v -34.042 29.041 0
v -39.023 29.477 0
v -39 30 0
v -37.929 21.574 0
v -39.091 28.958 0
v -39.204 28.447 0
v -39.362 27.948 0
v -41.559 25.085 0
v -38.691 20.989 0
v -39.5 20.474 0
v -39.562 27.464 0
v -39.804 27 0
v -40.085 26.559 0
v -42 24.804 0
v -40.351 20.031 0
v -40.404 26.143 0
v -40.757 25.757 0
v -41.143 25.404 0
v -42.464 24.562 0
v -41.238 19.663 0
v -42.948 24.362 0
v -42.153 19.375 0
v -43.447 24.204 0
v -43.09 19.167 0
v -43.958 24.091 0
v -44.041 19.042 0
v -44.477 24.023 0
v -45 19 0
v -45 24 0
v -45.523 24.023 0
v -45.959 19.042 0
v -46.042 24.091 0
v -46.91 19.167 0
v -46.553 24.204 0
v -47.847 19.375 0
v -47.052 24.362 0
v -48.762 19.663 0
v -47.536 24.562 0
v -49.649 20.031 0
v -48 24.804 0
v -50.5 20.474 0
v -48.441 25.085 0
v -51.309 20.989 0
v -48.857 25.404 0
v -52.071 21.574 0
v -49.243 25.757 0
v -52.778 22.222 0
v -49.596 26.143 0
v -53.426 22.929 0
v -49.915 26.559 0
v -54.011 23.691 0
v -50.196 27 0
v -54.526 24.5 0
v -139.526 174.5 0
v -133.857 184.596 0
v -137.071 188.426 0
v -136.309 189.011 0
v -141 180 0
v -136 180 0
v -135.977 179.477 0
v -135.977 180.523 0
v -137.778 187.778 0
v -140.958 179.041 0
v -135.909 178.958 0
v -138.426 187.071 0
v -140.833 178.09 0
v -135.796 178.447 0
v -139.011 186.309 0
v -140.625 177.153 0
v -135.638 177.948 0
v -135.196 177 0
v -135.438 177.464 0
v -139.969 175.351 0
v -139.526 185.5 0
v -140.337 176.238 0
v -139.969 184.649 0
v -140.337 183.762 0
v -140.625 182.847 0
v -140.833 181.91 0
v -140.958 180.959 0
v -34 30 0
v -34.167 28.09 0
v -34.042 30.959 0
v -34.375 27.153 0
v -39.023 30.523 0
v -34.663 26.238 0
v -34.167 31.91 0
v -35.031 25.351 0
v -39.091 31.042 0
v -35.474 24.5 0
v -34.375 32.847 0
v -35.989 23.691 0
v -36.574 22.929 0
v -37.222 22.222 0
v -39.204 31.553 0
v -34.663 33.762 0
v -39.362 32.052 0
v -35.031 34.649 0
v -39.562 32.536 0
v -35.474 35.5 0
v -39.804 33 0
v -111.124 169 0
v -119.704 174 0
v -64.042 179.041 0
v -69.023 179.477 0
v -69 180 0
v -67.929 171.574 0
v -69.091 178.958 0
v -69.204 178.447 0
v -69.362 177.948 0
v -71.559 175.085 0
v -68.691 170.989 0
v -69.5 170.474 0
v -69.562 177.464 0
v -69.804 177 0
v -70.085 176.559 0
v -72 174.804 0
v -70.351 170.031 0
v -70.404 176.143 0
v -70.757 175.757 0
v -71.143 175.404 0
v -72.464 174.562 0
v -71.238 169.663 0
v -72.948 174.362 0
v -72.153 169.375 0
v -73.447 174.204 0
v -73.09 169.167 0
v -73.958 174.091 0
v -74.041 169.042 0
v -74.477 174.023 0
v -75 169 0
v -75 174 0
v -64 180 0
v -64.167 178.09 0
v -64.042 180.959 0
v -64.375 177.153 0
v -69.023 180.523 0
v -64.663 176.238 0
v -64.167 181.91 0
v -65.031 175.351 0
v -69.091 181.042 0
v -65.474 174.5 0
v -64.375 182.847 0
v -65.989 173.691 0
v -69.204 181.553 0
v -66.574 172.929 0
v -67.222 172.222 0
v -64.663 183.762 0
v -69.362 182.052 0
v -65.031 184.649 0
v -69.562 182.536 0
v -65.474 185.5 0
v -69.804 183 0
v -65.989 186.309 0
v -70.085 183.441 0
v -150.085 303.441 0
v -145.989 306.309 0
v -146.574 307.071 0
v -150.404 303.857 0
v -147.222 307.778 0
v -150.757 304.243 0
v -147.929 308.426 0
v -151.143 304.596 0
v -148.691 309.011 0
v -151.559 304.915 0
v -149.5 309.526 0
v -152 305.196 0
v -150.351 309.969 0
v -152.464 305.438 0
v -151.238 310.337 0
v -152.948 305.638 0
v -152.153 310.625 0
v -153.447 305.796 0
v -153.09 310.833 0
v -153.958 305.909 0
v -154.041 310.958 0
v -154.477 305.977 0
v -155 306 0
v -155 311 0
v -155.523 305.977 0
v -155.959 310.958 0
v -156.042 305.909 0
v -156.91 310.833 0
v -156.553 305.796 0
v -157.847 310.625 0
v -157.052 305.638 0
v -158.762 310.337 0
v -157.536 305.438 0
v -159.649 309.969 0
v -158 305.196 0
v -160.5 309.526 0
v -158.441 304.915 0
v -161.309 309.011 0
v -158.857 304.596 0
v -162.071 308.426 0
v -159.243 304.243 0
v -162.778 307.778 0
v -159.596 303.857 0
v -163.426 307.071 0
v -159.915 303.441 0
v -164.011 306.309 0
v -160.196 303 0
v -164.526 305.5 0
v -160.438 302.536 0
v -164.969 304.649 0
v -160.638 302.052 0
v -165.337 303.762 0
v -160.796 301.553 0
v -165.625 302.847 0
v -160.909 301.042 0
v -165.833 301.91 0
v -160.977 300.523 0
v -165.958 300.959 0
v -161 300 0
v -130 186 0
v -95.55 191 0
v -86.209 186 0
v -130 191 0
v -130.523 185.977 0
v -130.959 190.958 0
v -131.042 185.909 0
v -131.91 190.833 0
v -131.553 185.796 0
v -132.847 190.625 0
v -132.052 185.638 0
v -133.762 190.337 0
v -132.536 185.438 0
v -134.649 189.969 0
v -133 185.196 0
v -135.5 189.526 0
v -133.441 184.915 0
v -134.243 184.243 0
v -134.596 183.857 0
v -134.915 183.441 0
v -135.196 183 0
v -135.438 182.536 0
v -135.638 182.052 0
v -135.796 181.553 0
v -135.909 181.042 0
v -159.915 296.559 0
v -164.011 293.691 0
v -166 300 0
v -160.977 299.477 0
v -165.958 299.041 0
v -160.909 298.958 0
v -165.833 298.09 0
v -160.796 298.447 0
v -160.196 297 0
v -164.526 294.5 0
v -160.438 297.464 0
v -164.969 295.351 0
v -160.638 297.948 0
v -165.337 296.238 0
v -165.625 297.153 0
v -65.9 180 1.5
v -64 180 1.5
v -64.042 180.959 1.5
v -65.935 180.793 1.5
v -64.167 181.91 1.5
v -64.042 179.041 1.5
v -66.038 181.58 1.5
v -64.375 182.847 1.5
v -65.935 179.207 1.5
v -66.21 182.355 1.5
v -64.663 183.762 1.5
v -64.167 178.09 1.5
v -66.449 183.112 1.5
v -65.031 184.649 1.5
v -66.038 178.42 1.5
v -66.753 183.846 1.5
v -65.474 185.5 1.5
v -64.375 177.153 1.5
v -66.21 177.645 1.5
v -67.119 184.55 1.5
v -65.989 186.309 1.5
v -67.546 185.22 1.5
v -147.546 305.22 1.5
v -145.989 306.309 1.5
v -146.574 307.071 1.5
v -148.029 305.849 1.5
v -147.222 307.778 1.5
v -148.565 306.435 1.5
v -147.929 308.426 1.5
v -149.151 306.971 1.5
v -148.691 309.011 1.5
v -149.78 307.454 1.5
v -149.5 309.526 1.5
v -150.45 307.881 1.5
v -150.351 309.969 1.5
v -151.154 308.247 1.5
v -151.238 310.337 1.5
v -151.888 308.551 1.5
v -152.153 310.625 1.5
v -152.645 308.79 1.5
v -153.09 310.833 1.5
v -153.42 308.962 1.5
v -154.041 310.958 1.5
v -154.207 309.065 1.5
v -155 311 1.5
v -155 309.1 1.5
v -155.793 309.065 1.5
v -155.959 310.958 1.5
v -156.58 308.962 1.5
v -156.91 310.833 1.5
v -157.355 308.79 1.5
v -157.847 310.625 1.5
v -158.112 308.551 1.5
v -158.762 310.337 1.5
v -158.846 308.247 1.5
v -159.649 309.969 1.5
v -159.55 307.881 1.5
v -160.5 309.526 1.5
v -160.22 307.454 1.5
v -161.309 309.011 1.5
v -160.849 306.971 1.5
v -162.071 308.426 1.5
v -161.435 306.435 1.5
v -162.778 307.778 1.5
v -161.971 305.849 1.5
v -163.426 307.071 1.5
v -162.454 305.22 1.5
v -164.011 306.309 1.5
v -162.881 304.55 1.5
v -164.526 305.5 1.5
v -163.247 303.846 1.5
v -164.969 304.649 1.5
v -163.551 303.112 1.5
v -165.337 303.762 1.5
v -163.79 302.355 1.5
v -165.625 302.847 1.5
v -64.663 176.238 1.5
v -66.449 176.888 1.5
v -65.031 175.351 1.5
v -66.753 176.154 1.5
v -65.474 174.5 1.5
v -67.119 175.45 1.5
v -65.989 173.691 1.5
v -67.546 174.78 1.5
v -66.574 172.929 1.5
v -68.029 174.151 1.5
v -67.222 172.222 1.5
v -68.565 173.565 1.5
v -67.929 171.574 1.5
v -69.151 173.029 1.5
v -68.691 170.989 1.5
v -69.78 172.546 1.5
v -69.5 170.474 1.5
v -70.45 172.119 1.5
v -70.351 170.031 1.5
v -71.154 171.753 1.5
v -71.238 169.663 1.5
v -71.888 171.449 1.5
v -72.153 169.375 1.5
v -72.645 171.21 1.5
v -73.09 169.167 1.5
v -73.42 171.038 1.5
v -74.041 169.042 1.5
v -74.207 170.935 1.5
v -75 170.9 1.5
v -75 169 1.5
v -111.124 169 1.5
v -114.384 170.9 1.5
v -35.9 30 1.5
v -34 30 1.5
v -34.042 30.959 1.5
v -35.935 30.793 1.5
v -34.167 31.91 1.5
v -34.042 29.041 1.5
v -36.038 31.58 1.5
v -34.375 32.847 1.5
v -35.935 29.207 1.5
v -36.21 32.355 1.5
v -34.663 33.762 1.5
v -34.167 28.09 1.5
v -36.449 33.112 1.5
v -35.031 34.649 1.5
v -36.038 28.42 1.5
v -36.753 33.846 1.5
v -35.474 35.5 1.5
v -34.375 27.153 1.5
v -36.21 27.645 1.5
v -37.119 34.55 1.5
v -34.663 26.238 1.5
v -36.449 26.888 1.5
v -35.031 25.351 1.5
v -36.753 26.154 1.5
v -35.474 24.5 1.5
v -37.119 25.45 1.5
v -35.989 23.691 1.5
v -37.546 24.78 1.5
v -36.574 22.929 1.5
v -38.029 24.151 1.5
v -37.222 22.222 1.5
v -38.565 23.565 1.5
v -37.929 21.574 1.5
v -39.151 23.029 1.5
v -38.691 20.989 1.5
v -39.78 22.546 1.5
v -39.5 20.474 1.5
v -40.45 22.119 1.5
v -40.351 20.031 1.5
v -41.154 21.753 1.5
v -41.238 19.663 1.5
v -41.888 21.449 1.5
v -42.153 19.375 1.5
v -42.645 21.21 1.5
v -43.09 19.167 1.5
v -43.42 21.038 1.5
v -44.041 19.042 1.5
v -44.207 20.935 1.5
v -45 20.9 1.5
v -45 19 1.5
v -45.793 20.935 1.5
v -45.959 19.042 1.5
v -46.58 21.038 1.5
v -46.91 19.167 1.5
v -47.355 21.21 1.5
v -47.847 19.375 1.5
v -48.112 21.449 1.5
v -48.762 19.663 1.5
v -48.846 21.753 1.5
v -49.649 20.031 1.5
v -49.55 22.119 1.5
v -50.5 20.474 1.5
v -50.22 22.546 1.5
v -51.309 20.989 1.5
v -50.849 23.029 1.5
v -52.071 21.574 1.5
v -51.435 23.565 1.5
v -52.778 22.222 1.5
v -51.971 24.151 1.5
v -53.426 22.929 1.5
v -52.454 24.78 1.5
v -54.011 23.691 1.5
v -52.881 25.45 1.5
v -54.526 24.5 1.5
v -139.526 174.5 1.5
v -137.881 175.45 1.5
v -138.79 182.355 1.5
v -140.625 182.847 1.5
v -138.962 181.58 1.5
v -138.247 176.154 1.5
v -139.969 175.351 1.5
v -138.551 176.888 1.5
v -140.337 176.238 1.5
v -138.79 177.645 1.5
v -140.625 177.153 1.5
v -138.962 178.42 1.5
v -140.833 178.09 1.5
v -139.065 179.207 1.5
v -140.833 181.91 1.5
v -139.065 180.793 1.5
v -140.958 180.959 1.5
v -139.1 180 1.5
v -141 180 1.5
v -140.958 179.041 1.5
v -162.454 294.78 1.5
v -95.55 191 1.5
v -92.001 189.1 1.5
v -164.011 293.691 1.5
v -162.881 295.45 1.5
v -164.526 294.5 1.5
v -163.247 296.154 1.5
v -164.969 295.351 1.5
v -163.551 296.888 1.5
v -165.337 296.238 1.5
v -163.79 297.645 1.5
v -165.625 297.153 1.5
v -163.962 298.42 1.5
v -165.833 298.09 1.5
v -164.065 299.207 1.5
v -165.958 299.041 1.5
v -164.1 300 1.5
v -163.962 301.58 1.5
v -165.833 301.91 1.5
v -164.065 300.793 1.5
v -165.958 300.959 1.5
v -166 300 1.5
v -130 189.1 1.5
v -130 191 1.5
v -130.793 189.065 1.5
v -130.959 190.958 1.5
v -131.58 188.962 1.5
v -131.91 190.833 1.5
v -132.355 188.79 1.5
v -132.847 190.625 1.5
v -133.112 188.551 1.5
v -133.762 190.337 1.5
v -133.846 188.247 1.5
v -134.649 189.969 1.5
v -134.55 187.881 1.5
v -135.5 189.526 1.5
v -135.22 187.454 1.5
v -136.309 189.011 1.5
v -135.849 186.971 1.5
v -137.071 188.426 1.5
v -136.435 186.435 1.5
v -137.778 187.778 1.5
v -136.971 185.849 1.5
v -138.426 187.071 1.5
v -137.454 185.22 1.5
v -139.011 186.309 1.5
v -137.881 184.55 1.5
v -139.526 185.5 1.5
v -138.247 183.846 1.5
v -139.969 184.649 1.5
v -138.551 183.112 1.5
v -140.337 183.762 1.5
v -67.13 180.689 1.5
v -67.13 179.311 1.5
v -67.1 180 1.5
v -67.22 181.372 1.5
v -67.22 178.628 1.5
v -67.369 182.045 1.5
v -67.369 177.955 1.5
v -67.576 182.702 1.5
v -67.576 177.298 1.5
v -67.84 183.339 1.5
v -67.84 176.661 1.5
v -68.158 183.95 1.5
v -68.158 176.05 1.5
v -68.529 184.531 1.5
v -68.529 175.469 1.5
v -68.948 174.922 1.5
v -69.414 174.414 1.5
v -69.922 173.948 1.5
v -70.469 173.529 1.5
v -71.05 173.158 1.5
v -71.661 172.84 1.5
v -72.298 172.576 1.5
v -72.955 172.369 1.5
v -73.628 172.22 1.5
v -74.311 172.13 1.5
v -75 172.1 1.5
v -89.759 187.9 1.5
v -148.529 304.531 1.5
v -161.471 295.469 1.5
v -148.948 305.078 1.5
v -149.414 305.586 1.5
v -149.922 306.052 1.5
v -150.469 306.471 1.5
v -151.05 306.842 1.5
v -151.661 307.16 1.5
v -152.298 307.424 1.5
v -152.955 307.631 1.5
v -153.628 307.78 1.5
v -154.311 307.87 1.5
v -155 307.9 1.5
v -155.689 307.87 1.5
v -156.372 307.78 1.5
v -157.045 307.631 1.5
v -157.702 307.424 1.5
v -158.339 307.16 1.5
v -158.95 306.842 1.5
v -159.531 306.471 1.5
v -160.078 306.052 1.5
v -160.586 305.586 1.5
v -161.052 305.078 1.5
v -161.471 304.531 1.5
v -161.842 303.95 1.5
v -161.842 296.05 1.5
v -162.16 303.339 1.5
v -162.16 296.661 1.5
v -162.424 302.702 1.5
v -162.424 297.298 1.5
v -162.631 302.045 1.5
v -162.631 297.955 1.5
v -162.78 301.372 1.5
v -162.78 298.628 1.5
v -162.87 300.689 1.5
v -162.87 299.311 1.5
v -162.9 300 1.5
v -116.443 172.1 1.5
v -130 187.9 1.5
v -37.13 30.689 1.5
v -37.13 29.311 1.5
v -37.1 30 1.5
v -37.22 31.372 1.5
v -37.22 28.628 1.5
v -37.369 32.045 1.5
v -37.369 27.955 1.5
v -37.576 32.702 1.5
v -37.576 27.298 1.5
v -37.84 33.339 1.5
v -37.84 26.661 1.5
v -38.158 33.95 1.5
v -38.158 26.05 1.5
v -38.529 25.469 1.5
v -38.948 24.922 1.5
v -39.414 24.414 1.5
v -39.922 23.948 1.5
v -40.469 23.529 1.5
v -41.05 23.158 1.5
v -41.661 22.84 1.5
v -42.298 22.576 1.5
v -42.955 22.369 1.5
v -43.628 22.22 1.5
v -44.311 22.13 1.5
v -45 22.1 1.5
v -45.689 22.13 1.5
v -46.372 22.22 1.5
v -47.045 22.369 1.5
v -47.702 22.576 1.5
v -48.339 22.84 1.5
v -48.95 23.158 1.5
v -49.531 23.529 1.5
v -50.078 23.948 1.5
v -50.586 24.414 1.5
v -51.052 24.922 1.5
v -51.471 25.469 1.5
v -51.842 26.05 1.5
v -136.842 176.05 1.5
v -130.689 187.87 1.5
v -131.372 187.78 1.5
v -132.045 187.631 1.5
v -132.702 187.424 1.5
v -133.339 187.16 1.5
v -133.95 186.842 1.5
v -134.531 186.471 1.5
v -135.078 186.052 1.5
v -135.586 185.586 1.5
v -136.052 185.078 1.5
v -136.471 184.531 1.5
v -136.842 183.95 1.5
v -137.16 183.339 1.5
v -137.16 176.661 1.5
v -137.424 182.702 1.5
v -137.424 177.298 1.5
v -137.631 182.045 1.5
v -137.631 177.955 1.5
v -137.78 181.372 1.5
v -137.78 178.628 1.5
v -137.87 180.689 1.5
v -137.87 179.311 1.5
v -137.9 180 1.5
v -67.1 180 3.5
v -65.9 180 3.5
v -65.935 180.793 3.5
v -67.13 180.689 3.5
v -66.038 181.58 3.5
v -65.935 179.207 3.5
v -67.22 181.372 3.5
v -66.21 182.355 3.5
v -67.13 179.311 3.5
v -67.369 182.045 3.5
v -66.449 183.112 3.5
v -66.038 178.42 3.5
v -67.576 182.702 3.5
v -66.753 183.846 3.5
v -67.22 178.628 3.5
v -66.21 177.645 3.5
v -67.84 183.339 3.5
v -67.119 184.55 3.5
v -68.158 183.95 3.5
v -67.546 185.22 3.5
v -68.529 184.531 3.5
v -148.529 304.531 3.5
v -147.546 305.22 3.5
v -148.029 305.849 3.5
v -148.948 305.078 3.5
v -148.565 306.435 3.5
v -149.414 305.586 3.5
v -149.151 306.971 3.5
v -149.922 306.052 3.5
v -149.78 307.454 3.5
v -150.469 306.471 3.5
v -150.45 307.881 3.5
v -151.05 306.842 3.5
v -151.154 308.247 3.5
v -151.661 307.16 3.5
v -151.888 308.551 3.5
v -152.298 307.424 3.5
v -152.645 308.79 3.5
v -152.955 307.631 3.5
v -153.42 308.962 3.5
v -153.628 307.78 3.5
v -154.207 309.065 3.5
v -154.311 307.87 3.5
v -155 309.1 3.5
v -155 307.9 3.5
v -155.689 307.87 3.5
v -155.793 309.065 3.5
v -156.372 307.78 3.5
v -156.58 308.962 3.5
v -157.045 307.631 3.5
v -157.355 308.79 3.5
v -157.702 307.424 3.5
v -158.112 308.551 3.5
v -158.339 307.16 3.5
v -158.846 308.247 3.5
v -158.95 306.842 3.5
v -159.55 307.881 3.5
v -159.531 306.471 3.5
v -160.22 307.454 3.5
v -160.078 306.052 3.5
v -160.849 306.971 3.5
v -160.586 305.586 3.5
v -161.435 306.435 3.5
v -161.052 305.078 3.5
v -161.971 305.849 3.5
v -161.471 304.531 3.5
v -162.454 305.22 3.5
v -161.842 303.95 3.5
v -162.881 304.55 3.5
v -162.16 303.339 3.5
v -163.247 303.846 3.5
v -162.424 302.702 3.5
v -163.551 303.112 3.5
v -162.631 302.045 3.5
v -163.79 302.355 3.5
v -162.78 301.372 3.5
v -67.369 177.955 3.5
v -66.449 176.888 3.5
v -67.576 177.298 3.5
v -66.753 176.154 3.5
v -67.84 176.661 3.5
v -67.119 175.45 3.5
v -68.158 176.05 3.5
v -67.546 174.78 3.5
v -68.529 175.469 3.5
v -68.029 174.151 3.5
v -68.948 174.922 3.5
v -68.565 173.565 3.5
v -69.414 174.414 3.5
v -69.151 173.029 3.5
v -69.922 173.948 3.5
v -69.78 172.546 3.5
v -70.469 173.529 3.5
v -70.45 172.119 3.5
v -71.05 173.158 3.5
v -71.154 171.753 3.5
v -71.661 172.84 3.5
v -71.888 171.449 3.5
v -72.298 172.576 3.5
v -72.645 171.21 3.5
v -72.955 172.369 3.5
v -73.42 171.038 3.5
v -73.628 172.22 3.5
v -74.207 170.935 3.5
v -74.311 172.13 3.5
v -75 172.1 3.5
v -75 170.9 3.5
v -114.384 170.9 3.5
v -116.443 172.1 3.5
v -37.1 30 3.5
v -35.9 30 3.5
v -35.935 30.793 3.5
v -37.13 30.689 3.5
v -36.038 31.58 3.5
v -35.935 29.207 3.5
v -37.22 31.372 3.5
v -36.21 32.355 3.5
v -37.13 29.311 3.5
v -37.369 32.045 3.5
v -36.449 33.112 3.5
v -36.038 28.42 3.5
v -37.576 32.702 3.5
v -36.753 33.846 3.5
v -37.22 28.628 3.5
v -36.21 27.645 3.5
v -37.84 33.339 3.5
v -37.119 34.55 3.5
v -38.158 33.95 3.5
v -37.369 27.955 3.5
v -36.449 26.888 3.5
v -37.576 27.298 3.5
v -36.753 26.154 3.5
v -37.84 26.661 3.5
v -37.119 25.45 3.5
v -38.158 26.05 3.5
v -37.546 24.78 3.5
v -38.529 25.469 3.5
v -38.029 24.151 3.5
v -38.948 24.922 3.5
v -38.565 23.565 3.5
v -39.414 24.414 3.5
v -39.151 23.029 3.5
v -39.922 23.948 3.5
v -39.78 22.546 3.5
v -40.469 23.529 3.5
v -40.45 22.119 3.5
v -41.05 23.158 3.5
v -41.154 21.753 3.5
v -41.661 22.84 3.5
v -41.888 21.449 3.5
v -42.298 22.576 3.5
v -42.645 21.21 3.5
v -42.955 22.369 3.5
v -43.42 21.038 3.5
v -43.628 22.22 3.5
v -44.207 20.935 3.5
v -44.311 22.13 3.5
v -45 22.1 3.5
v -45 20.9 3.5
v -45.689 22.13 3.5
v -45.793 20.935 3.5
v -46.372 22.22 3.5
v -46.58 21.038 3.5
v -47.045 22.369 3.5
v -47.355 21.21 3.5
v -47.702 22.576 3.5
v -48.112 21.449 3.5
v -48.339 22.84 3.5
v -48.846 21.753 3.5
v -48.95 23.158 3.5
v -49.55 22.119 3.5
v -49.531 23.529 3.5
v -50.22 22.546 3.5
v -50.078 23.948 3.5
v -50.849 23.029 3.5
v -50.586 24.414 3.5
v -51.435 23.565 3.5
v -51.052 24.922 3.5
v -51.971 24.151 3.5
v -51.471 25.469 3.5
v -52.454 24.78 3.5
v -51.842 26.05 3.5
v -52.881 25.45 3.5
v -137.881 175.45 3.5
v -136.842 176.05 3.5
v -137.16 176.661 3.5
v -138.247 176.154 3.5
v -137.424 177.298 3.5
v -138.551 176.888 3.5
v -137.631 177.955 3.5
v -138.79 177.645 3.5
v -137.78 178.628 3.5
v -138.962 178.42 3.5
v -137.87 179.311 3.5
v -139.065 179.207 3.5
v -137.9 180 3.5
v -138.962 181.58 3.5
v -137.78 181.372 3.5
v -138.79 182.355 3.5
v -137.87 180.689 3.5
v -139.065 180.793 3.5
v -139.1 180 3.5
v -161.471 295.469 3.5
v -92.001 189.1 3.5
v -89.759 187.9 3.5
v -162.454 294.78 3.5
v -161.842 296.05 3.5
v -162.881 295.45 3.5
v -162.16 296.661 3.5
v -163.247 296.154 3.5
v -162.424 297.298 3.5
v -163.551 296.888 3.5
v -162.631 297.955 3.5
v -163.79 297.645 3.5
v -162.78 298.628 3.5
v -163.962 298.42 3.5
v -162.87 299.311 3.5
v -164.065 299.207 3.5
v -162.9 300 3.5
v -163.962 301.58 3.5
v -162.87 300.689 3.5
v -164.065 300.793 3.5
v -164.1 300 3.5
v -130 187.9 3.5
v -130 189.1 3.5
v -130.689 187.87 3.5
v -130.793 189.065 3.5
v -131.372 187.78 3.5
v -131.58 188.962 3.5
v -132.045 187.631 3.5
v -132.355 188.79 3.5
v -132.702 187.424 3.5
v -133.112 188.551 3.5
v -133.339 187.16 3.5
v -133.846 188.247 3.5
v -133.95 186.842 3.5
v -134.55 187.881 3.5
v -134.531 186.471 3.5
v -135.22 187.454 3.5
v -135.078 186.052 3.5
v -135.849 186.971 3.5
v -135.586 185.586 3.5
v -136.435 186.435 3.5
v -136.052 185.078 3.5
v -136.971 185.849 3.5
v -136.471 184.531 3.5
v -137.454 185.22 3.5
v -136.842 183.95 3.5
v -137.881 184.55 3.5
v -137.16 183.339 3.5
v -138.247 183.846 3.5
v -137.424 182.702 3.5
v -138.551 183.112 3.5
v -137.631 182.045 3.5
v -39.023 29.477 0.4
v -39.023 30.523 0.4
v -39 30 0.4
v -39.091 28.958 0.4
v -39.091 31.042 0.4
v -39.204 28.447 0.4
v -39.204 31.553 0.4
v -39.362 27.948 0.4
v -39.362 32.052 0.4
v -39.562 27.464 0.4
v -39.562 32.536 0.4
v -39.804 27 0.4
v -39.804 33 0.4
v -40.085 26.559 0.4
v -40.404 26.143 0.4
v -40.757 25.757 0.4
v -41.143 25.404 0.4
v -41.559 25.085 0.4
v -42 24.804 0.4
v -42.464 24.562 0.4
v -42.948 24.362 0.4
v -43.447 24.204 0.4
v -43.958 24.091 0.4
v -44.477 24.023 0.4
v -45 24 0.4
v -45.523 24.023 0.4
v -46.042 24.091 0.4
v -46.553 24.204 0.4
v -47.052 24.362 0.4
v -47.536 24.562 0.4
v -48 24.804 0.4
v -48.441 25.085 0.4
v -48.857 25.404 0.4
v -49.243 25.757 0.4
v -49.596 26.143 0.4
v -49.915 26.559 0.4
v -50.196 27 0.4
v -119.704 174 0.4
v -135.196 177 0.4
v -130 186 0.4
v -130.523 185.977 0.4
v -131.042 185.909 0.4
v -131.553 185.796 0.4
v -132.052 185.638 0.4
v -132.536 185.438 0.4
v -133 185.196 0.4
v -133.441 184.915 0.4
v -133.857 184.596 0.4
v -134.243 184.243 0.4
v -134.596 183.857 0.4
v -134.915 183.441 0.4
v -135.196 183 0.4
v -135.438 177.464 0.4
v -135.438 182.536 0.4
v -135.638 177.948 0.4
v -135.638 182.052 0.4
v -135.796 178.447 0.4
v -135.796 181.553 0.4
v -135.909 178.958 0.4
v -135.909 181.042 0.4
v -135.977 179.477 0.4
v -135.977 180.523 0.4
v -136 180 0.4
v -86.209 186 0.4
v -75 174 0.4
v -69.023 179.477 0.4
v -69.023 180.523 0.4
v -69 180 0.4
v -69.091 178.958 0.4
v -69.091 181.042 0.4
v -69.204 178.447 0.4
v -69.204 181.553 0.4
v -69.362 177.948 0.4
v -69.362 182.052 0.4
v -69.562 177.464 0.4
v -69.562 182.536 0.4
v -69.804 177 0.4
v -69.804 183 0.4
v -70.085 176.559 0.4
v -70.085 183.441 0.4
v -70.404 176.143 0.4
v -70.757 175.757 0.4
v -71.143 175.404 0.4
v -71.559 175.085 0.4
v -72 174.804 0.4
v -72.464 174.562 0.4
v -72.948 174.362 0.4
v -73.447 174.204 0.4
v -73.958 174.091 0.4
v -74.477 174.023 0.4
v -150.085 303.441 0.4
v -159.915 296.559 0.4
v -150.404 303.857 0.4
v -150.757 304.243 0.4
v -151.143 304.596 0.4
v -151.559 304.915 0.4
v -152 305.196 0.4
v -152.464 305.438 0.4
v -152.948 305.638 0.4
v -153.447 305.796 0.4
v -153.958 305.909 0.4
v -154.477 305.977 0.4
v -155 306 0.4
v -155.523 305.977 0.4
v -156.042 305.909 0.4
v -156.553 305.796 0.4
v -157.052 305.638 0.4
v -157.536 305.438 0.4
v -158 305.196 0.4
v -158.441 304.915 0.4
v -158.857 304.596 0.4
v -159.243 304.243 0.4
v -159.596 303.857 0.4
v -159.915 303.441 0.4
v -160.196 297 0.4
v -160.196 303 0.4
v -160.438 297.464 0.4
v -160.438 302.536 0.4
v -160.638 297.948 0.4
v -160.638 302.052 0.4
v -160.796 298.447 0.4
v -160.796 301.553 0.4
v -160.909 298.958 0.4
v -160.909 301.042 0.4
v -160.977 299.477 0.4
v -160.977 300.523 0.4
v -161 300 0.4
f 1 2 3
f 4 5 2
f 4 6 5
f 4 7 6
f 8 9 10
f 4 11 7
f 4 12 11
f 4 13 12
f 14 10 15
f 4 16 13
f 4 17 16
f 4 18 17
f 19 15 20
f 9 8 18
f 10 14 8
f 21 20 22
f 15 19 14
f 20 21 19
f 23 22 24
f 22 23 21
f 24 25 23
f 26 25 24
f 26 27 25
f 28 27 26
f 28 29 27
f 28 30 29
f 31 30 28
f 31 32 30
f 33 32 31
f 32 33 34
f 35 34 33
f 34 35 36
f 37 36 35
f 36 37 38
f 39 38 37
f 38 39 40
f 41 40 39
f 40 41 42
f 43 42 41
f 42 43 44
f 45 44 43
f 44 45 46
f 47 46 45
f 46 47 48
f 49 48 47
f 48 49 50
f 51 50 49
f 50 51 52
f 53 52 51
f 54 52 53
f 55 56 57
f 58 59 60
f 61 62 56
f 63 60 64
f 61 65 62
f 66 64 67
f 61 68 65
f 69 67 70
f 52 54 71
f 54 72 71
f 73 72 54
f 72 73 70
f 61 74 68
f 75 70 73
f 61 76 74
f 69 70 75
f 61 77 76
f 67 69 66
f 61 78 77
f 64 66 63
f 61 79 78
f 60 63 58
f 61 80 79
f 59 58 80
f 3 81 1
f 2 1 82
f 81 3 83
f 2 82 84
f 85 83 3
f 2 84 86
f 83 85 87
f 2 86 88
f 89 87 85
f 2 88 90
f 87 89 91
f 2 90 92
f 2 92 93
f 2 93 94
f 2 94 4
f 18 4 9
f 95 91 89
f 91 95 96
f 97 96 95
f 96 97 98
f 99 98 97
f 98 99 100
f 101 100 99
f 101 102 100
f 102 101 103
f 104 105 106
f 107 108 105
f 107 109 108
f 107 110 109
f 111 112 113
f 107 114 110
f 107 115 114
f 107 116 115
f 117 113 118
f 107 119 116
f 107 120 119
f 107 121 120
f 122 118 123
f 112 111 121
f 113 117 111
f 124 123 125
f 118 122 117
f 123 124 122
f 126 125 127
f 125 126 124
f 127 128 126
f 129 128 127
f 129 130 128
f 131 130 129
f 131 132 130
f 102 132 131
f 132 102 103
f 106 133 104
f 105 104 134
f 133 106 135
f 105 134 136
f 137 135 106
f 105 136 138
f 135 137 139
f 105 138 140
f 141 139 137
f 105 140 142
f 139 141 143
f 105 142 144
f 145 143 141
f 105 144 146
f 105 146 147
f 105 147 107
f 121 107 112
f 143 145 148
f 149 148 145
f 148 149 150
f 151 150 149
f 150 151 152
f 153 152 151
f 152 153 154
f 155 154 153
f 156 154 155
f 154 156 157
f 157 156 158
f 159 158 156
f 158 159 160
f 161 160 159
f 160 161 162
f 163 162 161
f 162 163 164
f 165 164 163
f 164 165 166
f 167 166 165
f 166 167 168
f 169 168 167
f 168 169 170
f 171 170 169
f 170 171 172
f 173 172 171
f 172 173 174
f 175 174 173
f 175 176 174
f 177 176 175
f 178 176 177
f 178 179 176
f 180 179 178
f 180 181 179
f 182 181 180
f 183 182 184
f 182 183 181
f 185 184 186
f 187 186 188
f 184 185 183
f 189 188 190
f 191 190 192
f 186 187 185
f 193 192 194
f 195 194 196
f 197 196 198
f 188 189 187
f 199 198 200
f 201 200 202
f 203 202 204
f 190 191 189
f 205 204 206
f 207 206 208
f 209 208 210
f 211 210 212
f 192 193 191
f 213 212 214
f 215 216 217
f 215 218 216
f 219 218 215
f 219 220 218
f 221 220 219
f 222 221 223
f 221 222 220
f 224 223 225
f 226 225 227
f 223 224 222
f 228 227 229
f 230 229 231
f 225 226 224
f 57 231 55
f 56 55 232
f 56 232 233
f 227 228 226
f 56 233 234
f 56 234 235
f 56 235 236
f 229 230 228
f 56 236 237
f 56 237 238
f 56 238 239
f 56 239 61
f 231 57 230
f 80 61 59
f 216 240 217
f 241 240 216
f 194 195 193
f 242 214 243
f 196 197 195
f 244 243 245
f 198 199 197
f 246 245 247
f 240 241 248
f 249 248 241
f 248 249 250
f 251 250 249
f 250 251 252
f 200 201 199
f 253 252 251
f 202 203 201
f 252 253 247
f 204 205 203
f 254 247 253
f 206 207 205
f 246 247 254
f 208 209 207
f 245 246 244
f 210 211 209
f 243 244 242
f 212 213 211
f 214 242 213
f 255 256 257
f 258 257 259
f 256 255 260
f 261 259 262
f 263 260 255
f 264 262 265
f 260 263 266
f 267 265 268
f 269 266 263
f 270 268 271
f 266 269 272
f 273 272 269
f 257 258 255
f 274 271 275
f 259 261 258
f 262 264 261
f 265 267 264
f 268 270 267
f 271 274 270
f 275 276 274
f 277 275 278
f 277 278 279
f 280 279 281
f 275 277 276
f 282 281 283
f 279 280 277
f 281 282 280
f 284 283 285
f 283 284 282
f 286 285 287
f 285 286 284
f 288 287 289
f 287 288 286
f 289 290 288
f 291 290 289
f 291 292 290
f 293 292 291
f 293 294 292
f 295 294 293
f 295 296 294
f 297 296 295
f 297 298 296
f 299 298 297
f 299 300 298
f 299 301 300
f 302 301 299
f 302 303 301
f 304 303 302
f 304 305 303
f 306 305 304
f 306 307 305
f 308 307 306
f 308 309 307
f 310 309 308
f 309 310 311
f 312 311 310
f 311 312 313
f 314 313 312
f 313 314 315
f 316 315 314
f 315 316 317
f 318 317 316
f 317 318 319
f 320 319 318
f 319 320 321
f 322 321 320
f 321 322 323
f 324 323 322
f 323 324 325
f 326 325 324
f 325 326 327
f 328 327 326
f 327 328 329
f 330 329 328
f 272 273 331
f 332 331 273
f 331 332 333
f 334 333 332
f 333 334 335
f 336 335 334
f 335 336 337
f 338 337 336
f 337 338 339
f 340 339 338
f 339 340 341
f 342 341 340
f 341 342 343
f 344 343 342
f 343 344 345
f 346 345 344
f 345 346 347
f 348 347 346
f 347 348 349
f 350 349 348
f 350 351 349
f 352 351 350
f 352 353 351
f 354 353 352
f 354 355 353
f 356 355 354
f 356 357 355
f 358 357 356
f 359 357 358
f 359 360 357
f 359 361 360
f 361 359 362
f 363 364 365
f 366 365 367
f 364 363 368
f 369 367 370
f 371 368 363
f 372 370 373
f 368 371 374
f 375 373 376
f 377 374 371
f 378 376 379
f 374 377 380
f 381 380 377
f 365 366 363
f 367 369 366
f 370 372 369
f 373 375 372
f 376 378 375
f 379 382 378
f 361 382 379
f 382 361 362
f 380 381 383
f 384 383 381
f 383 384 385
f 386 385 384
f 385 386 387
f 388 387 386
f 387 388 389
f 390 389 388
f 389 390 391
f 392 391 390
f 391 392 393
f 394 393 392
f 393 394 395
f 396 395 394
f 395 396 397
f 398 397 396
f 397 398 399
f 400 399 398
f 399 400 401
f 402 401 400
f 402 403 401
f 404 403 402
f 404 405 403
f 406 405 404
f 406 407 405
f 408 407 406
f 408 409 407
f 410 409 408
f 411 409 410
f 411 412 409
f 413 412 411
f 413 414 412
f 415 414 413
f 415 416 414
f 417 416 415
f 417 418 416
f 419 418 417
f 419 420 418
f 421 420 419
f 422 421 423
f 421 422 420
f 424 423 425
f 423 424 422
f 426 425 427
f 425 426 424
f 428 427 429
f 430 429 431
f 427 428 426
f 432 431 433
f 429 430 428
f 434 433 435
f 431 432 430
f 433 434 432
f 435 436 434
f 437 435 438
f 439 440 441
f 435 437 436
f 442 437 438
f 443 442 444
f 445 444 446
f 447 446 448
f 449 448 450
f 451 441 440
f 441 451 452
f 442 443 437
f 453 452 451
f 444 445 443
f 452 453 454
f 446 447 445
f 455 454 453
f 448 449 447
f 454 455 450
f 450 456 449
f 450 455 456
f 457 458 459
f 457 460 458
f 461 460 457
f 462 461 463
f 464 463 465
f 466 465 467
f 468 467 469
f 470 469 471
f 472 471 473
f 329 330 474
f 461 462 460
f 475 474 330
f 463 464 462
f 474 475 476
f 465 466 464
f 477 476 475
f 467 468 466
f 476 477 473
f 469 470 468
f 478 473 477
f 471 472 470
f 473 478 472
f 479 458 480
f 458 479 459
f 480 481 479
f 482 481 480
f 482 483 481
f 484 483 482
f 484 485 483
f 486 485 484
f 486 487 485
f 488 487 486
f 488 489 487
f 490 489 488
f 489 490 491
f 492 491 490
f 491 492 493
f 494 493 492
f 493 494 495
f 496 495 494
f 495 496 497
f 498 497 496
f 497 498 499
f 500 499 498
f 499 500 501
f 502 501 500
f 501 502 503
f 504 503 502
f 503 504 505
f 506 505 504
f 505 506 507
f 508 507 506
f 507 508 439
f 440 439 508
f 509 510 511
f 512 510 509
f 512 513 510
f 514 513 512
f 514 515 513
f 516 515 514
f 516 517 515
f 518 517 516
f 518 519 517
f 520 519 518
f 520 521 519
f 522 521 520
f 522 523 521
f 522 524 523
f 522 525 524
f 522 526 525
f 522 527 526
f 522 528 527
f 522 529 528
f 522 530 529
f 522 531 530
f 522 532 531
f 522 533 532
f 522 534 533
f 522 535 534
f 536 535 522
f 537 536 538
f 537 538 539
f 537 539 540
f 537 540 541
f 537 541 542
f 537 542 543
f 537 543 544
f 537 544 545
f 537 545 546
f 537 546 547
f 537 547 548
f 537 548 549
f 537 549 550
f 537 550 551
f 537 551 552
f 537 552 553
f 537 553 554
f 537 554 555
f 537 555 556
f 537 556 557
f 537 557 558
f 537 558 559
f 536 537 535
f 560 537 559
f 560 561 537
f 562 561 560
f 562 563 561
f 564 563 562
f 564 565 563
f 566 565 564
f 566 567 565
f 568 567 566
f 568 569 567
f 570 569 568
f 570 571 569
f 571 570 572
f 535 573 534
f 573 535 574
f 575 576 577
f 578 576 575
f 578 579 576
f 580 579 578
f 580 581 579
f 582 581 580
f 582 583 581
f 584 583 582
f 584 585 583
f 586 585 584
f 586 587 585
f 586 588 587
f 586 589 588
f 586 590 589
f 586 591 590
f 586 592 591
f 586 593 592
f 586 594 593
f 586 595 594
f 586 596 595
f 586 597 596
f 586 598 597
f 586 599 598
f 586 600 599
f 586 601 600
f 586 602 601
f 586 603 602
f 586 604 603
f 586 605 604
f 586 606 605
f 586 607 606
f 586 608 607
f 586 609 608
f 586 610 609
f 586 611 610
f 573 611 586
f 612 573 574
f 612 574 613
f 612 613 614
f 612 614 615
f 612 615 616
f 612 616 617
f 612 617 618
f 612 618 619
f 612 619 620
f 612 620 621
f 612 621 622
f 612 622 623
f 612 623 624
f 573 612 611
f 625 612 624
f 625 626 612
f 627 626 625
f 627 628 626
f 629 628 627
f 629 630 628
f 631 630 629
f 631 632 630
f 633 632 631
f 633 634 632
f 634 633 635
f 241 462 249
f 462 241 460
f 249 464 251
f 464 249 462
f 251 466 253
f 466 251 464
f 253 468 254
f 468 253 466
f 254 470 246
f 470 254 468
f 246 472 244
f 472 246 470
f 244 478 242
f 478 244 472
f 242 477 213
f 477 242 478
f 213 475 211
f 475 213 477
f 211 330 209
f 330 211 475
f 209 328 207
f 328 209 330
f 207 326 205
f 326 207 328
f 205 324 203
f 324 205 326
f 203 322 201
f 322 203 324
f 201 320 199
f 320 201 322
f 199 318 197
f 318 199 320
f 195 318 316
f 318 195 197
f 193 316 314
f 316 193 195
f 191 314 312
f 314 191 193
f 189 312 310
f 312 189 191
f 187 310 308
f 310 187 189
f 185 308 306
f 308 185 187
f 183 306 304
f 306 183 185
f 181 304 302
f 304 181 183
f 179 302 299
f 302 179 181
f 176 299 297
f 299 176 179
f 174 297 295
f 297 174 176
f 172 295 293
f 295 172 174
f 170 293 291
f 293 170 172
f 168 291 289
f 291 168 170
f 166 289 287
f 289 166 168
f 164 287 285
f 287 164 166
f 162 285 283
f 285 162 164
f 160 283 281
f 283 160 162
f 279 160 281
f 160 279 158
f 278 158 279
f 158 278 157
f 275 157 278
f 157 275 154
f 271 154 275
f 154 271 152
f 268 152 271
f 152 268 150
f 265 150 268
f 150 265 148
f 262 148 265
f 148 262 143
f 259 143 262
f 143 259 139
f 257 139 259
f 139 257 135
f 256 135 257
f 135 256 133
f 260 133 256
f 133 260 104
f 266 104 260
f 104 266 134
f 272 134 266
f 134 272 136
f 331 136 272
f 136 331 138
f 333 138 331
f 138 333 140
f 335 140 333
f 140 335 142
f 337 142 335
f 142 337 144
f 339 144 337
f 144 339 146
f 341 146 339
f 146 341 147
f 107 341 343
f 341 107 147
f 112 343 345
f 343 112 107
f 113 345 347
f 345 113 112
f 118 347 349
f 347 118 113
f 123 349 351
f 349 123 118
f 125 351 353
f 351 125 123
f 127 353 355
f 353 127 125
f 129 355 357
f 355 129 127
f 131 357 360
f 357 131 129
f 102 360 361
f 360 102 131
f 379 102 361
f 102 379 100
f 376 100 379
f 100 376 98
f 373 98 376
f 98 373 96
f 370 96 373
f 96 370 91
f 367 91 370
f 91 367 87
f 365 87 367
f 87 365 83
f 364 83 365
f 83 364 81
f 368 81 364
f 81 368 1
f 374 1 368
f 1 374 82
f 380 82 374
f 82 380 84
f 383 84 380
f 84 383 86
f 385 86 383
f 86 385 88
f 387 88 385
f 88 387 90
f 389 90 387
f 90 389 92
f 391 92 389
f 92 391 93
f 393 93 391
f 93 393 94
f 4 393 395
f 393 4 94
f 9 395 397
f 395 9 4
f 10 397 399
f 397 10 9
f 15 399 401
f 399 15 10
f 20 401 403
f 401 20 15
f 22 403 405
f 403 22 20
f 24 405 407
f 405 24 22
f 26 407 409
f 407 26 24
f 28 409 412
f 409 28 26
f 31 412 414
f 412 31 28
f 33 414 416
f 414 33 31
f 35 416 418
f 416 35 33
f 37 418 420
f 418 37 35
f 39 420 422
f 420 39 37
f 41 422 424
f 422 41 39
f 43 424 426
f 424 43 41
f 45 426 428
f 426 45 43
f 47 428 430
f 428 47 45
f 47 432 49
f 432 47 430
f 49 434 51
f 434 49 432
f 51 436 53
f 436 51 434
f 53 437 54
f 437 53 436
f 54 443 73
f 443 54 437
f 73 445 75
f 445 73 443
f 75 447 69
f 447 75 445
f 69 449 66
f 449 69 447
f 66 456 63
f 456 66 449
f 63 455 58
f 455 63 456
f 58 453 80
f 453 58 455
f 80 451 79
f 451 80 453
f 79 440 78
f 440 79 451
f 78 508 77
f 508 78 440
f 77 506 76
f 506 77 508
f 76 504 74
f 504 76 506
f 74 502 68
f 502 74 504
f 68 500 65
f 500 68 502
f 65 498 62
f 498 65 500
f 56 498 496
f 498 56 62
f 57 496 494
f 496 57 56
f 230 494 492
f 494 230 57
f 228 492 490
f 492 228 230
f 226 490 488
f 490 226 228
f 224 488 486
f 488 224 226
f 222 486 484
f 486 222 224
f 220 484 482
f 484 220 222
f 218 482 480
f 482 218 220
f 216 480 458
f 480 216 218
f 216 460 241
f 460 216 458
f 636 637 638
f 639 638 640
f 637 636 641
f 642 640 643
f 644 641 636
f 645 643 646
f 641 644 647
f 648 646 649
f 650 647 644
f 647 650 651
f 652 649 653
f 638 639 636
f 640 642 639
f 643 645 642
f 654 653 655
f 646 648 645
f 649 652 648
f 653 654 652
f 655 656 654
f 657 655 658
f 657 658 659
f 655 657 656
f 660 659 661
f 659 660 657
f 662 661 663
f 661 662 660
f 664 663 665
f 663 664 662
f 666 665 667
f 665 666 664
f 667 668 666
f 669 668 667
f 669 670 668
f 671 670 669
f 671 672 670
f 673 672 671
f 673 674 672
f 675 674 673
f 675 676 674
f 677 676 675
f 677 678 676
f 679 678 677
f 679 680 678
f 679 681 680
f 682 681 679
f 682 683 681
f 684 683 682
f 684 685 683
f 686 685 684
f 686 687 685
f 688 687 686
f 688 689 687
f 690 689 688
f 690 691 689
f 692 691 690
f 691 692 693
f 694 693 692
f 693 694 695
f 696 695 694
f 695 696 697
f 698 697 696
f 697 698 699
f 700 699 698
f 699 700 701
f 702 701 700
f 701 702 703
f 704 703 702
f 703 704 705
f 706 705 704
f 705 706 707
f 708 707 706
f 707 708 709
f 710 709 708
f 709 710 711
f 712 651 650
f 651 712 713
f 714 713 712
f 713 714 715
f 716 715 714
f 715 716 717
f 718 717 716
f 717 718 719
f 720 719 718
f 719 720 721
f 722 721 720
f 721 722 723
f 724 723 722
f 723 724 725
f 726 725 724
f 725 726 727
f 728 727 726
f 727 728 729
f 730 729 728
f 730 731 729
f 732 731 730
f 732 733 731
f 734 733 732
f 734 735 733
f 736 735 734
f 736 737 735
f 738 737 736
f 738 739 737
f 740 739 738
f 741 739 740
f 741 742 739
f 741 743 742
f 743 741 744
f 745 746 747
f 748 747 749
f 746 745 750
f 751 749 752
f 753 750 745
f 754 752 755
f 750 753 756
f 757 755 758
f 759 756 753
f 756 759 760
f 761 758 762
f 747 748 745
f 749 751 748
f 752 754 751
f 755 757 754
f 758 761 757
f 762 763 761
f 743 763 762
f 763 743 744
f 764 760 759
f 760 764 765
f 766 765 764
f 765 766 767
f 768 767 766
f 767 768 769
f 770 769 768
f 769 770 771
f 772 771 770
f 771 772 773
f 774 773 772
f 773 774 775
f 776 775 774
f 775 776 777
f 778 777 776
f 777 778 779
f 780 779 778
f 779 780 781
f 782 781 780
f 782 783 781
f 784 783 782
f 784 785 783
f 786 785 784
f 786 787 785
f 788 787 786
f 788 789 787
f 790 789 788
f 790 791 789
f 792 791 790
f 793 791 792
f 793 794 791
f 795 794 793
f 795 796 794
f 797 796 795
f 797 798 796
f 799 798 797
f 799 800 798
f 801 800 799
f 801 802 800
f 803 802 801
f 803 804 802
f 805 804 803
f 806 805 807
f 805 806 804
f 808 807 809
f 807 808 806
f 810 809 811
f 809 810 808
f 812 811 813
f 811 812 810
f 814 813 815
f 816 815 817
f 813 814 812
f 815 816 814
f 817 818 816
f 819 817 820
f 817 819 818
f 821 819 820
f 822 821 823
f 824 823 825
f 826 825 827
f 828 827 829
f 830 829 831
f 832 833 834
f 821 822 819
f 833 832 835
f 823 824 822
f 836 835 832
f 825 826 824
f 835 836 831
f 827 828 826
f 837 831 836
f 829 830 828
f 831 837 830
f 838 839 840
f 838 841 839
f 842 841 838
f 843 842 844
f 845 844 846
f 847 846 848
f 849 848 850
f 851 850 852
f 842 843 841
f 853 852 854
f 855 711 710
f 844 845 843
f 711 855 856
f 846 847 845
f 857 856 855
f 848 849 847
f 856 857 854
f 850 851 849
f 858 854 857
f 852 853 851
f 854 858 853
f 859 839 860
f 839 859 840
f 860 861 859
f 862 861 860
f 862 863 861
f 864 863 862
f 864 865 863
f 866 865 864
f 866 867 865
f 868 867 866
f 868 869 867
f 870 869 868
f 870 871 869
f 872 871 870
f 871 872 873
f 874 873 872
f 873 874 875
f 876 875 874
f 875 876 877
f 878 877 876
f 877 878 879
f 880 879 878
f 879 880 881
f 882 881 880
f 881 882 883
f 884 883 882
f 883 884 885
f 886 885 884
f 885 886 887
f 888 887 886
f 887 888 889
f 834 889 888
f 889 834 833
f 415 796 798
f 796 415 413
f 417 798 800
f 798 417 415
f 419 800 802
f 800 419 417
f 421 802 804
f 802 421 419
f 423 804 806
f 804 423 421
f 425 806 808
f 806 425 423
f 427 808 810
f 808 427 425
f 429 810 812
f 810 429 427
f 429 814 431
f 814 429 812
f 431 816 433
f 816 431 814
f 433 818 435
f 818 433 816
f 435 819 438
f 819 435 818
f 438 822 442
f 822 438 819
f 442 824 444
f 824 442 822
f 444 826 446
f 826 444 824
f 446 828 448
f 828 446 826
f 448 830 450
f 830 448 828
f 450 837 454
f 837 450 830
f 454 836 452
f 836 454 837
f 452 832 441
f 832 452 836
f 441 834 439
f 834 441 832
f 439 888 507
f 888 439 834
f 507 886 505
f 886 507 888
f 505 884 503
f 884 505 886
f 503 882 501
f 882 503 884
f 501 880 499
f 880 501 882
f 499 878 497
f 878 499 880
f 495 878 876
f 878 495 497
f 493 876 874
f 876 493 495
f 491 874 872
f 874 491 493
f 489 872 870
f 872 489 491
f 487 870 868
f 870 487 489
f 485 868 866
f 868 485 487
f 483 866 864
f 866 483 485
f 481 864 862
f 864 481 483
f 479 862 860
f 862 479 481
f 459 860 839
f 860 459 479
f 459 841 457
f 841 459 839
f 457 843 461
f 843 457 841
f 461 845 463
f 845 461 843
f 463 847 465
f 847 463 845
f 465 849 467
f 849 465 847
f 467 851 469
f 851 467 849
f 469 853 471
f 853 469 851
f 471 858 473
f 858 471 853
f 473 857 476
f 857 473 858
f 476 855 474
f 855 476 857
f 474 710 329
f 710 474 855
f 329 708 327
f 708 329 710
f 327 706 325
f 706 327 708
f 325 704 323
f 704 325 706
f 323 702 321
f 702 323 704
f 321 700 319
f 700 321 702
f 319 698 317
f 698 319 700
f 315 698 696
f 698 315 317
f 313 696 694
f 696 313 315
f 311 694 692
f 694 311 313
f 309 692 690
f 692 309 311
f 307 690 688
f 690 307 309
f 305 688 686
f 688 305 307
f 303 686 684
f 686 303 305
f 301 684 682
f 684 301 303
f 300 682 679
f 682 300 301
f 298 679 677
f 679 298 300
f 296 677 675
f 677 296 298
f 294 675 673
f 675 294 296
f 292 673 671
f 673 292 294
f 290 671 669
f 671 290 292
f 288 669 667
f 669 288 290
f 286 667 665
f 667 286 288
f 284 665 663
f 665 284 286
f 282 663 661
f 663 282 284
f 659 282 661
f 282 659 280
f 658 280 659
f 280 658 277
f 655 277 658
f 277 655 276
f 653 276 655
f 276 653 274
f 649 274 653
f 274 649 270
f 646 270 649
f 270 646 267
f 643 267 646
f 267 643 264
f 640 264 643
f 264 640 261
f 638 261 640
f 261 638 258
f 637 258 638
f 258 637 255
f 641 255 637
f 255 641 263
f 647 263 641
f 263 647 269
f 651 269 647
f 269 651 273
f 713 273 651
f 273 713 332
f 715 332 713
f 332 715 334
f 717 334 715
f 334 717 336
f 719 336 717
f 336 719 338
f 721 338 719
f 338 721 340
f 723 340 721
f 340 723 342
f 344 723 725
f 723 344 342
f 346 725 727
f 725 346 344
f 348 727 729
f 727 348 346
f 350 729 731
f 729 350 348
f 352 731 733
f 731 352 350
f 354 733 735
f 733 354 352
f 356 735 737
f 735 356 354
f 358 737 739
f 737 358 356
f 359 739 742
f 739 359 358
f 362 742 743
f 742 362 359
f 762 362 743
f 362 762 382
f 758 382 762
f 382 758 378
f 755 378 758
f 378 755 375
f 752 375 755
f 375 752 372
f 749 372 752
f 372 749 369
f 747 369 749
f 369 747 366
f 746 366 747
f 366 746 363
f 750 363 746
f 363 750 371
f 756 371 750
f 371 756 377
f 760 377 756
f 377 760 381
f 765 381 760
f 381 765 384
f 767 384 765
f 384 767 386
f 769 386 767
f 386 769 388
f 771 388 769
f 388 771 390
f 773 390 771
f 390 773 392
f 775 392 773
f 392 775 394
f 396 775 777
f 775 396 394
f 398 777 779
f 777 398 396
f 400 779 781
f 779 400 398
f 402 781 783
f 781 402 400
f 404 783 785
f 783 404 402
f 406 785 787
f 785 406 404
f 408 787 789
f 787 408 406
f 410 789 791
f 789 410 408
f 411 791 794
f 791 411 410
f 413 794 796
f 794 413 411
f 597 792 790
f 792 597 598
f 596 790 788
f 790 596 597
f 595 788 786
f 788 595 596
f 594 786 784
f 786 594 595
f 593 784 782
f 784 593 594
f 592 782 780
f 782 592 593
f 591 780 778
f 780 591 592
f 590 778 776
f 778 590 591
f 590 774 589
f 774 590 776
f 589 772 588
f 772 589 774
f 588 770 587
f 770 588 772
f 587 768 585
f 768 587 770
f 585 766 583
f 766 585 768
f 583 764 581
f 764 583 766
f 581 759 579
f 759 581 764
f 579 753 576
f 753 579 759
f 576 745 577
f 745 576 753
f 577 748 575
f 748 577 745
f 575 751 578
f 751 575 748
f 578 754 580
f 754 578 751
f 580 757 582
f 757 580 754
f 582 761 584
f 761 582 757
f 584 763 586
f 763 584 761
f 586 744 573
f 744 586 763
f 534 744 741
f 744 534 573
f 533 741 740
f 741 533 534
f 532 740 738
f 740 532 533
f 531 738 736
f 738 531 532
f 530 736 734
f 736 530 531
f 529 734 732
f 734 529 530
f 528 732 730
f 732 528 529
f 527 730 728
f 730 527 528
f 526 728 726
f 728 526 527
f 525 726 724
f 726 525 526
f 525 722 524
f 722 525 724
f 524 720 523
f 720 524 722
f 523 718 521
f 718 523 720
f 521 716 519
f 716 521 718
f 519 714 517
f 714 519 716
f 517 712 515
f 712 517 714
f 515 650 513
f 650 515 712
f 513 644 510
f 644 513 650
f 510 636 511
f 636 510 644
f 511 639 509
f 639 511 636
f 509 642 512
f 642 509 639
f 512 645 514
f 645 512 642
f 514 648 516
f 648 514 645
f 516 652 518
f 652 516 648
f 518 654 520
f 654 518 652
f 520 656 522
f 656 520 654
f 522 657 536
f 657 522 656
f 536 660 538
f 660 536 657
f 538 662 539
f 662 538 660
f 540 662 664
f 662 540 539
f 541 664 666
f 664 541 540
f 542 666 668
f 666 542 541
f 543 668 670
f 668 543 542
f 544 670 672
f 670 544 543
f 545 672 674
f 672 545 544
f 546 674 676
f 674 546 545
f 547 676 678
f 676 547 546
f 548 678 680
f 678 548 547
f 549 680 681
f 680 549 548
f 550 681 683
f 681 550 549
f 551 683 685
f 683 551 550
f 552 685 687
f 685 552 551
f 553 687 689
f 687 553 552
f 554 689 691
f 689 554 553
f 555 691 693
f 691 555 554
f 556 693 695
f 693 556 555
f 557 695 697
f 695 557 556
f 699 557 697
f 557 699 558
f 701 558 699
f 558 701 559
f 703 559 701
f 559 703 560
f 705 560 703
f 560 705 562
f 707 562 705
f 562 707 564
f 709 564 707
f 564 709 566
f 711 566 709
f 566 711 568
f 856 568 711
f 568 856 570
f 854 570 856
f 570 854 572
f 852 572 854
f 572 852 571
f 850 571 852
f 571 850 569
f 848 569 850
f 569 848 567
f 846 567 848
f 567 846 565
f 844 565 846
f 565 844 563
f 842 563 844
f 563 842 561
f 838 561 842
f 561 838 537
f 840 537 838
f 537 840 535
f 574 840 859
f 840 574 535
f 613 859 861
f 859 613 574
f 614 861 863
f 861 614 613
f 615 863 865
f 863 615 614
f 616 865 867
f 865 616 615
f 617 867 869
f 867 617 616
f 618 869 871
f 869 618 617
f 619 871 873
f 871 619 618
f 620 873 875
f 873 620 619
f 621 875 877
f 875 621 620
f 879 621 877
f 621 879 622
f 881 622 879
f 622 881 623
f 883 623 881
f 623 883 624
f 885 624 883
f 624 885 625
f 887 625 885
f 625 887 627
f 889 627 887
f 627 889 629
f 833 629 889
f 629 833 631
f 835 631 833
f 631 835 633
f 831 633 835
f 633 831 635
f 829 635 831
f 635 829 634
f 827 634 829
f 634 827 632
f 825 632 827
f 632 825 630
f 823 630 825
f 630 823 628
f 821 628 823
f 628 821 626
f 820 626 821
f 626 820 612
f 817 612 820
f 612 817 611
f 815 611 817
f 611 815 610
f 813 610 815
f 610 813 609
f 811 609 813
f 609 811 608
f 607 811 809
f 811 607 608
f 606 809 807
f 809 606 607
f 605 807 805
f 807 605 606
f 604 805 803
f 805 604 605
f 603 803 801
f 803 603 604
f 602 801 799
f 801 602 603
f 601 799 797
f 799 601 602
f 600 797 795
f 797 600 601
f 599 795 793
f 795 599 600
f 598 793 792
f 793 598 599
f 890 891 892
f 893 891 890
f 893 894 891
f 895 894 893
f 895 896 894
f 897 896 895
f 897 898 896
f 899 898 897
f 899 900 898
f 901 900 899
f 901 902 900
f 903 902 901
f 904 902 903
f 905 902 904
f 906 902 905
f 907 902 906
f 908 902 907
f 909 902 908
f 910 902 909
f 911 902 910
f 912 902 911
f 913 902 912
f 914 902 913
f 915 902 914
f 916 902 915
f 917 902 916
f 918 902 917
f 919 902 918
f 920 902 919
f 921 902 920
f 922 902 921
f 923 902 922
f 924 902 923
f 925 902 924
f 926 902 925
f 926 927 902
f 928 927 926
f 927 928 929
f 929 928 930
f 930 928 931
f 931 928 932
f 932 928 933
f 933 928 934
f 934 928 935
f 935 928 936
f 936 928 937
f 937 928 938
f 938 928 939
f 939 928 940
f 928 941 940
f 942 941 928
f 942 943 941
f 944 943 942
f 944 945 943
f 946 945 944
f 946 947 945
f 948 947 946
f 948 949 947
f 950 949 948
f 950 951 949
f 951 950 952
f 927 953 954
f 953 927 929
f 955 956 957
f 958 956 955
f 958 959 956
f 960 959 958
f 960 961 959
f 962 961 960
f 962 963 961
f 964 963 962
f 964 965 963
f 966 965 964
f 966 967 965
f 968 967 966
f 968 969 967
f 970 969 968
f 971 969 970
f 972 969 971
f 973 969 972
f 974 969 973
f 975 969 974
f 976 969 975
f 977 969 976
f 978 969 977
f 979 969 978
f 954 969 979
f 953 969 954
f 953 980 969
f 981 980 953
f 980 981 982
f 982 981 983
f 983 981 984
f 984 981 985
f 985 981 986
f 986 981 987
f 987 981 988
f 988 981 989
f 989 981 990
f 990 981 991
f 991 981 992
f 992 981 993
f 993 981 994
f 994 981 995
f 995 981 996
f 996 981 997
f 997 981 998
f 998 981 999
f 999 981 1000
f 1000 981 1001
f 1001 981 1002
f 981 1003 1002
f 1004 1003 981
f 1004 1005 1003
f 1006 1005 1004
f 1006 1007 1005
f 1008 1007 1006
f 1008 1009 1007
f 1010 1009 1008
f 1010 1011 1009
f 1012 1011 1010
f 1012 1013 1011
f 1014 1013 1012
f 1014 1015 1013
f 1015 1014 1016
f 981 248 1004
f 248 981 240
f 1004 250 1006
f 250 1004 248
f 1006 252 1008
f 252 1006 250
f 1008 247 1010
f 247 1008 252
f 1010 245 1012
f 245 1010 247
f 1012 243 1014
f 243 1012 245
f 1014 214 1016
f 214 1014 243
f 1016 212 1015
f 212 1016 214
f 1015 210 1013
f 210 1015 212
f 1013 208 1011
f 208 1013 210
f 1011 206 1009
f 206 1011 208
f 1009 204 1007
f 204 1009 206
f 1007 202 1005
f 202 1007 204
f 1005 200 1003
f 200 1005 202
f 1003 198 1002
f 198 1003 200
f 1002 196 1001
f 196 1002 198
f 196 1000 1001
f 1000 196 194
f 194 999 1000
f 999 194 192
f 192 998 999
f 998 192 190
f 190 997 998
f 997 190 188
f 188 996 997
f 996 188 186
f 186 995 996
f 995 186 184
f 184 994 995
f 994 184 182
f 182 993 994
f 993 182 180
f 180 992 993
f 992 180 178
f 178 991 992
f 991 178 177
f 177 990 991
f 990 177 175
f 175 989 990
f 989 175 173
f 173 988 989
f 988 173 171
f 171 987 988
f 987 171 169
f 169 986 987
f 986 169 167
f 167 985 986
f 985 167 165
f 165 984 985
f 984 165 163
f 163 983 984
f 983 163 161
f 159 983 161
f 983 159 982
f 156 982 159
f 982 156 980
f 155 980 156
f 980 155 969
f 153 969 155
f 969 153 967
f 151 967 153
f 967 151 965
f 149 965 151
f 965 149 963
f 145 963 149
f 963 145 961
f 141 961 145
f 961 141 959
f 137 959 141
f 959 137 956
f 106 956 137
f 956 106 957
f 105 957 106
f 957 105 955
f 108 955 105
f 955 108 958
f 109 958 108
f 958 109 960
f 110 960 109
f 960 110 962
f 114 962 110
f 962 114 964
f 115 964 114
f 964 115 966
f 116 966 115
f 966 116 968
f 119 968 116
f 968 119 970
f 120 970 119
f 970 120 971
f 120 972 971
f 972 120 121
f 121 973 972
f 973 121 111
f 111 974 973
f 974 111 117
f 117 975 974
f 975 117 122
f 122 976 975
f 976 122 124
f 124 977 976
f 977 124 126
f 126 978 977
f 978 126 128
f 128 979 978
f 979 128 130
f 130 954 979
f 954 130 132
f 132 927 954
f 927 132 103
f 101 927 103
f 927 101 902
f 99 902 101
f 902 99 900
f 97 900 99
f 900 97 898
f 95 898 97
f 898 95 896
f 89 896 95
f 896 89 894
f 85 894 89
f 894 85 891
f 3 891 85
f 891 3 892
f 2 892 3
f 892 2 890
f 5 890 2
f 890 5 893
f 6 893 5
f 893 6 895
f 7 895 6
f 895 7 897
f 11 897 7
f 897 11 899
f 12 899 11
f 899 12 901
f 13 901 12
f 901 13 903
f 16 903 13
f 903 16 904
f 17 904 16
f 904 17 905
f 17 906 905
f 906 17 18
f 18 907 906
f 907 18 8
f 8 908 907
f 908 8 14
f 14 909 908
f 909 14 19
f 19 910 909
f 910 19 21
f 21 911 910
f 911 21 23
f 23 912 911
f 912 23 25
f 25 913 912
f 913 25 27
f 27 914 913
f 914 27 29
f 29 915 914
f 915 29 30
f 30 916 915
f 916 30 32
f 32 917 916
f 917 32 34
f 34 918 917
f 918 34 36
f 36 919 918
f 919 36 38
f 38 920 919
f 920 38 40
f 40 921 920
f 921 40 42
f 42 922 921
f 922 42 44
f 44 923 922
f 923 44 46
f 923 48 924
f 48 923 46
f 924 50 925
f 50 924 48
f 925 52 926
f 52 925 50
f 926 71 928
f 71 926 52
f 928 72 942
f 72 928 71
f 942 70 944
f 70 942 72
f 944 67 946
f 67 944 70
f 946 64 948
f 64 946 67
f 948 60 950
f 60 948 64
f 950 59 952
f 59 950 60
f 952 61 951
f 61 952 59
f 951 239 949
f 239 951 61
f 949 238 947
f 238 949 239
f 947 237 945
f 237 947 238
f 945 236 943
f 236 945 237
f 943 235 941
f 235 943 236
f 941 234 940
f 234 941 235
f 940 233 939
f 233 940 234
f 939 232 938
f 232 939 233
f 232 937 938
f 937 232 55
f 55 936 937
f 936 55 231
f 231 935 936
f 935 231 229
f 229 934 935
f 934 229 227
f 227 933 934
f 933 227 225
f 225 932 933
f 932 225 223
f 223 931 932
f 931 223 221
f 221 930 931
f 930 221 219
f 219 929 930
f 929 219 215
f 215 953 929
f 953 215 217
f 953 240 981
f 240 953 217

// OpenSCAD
// file: ../collar.scad
// Calibrated press-fit collar, merged into the rear wall at each pixel.
// The STL is symmetric top/bottom (retention lip at mid-height), so insertion
// direction does not matter. Native STL sits X-centered at collar_cx, Z 0..collar_h.

module collar_solid() {
    translate([-collar_cx, 0, 0])
        import(collar_stl, convexity = 6);
}

module place_collar(x, y) {
    translate([x, y, 0]) collar_solid();
}
// file: ../config.scad
// ===== CHARGE LED sign — global config =====
// Edit this file; then run ./build.sh to regenerate every STL.

$fn = 72;

// ---- bullet pixel datasheet (measured + validated) ----
// dome Ø8, barrel Ø12, flange Ø13.6 x 2mm, dome-tip -> flange 5.5mm.
// Above the plate: ~Ø12 barrel for ~0.5mm, then the Ø8 dome to a tip ~dome_clear
// above the plate front. Drives pixel_through, dome_clear, and led_void clearances.

// ---- calibrated collar (press-fit for 12mm bullet pixel) ----
collar_stl    = "../../assets/bullet-collar.stl"; // path resolved from src/parts/ entry files
collar_h      = 2.0;     // Z span of the collar STL
collar_od     = 16.0;    // collar outer diameter
collar_cx     = 43.0;    // STL native X center (Y center is 0)
pixel_through = 12.3;    // clearance hole through the plate (just over bore Ø12.19)
dome_clear    = 4.0;     // dome protrusion above plate front. Spec: 5.5mm dome-tip-to-flange,
                         // flange seats on plate back, minus 2mm plate ~= 3.5-4mm. Seat a real
                         // pixel and measure to lock it in.

// ---- shell ----
plate_t    = 2.0;        // rear plate thickness (== collar_h, so the collar sits flush)
wall_t     = 2.5;        // chimney wall thickness
cell_inner = 30;         // square interior of each test cell (the press-fit opening)

// ---- diffuser panels (flat, drop-in — kept for the final glued option) ----
panel_press_clear = 0.25; // panel is this much SMALLER than the opening (total) -> friction fit
panel_thicks      = [1, 2, 3];

// ---- diffuser CAP (slides over an ISOLATED chimney; not used on touching rows) ----
cap_fit_clear = 0.4;   // skirt-inner minus chimney-outer (total); bigger = looser slide
cap_skirt_t   = 1.6;   // skirt wall thickness
cap_skirt_h   = 7;     // how far the skirt grips down over the chimney

// ---- diffuser LID = flanged plug (plug locates in the opening, flange catches on the rim) ----
lid_flange_cover = wall_t;  // flange overhang per side ~= wall width (rests on rim, can't fall in)
lid_flange_gap   = 0.3;     // shrink the flange a hair so neighbour lids don't clash
lid_plug_h       = 4;       // how far the plug drops into the opening (0 = plain flat tile)
lid_plug_clear   = 0.2;     // plug-outer = opening minus this (total) -> friction fit
                            // (was 0.5/loose; PETG plug in a PLA hole grips well at 0.2)
lid_plug_wall    = 1.5;     // plug-frame wall thickness

// ---- coupon depth ladder ----
led_gaps = [10, 15, 20]; // clear LED-tip -> diffuser distance, per cell (mm)
                         // (was [20,35,50] — 35/50 went too dim/washed; 20 is the new max)

// ---- collar v2: original bore + lip, plus a 45-deg lead-in chamfer ----
bore_face_r   = 6.10;    // collar bore radius at each face (~Ø12.2)
chamfer_depth = 0.5;     // axial depth of the 45-deg lead-in at each face
mouth_r       = bore_face_r + chamfer_depth;  // chamfer mouth radius (~Ø13.2)

// ---- collar A/B test harness ----
harness_w     = 52;      // tile width
harness_d     = 30;      // tile depth
harness_t     = plate_t; // match the real wall thickness for a faithful fit test
harness_pitch = 24;      // spacing between the two hole centers

// ---- derived ----
cell_pitch = cell_inner + 2 * wall_t;      // outer cell footprint (35)
n_cells    = len(led_gaps);
plate_w    = n_cells * cell_pitch;
plate_d    = cell_pitch;
panel_side = cell_inner - panel_press_clear;
function cell_x(i)     = i * cell_pitch + cell_pitch / 2;   // column center (distance)
function cell_y(j)     = j * cell_pitch + cell_pitch / 2;   // row center (for grid coupons)
function chimney_H(i)  = plate_t + dome_clear + led_gaps[i];
// main file
// V1 CLEAR part: clear edges + body + lip (center stripe removed). filament 2.
include <../config.scad>
include <../collar.scad>
include <../bolt.scad>
bolt_lens_v1_clear();
